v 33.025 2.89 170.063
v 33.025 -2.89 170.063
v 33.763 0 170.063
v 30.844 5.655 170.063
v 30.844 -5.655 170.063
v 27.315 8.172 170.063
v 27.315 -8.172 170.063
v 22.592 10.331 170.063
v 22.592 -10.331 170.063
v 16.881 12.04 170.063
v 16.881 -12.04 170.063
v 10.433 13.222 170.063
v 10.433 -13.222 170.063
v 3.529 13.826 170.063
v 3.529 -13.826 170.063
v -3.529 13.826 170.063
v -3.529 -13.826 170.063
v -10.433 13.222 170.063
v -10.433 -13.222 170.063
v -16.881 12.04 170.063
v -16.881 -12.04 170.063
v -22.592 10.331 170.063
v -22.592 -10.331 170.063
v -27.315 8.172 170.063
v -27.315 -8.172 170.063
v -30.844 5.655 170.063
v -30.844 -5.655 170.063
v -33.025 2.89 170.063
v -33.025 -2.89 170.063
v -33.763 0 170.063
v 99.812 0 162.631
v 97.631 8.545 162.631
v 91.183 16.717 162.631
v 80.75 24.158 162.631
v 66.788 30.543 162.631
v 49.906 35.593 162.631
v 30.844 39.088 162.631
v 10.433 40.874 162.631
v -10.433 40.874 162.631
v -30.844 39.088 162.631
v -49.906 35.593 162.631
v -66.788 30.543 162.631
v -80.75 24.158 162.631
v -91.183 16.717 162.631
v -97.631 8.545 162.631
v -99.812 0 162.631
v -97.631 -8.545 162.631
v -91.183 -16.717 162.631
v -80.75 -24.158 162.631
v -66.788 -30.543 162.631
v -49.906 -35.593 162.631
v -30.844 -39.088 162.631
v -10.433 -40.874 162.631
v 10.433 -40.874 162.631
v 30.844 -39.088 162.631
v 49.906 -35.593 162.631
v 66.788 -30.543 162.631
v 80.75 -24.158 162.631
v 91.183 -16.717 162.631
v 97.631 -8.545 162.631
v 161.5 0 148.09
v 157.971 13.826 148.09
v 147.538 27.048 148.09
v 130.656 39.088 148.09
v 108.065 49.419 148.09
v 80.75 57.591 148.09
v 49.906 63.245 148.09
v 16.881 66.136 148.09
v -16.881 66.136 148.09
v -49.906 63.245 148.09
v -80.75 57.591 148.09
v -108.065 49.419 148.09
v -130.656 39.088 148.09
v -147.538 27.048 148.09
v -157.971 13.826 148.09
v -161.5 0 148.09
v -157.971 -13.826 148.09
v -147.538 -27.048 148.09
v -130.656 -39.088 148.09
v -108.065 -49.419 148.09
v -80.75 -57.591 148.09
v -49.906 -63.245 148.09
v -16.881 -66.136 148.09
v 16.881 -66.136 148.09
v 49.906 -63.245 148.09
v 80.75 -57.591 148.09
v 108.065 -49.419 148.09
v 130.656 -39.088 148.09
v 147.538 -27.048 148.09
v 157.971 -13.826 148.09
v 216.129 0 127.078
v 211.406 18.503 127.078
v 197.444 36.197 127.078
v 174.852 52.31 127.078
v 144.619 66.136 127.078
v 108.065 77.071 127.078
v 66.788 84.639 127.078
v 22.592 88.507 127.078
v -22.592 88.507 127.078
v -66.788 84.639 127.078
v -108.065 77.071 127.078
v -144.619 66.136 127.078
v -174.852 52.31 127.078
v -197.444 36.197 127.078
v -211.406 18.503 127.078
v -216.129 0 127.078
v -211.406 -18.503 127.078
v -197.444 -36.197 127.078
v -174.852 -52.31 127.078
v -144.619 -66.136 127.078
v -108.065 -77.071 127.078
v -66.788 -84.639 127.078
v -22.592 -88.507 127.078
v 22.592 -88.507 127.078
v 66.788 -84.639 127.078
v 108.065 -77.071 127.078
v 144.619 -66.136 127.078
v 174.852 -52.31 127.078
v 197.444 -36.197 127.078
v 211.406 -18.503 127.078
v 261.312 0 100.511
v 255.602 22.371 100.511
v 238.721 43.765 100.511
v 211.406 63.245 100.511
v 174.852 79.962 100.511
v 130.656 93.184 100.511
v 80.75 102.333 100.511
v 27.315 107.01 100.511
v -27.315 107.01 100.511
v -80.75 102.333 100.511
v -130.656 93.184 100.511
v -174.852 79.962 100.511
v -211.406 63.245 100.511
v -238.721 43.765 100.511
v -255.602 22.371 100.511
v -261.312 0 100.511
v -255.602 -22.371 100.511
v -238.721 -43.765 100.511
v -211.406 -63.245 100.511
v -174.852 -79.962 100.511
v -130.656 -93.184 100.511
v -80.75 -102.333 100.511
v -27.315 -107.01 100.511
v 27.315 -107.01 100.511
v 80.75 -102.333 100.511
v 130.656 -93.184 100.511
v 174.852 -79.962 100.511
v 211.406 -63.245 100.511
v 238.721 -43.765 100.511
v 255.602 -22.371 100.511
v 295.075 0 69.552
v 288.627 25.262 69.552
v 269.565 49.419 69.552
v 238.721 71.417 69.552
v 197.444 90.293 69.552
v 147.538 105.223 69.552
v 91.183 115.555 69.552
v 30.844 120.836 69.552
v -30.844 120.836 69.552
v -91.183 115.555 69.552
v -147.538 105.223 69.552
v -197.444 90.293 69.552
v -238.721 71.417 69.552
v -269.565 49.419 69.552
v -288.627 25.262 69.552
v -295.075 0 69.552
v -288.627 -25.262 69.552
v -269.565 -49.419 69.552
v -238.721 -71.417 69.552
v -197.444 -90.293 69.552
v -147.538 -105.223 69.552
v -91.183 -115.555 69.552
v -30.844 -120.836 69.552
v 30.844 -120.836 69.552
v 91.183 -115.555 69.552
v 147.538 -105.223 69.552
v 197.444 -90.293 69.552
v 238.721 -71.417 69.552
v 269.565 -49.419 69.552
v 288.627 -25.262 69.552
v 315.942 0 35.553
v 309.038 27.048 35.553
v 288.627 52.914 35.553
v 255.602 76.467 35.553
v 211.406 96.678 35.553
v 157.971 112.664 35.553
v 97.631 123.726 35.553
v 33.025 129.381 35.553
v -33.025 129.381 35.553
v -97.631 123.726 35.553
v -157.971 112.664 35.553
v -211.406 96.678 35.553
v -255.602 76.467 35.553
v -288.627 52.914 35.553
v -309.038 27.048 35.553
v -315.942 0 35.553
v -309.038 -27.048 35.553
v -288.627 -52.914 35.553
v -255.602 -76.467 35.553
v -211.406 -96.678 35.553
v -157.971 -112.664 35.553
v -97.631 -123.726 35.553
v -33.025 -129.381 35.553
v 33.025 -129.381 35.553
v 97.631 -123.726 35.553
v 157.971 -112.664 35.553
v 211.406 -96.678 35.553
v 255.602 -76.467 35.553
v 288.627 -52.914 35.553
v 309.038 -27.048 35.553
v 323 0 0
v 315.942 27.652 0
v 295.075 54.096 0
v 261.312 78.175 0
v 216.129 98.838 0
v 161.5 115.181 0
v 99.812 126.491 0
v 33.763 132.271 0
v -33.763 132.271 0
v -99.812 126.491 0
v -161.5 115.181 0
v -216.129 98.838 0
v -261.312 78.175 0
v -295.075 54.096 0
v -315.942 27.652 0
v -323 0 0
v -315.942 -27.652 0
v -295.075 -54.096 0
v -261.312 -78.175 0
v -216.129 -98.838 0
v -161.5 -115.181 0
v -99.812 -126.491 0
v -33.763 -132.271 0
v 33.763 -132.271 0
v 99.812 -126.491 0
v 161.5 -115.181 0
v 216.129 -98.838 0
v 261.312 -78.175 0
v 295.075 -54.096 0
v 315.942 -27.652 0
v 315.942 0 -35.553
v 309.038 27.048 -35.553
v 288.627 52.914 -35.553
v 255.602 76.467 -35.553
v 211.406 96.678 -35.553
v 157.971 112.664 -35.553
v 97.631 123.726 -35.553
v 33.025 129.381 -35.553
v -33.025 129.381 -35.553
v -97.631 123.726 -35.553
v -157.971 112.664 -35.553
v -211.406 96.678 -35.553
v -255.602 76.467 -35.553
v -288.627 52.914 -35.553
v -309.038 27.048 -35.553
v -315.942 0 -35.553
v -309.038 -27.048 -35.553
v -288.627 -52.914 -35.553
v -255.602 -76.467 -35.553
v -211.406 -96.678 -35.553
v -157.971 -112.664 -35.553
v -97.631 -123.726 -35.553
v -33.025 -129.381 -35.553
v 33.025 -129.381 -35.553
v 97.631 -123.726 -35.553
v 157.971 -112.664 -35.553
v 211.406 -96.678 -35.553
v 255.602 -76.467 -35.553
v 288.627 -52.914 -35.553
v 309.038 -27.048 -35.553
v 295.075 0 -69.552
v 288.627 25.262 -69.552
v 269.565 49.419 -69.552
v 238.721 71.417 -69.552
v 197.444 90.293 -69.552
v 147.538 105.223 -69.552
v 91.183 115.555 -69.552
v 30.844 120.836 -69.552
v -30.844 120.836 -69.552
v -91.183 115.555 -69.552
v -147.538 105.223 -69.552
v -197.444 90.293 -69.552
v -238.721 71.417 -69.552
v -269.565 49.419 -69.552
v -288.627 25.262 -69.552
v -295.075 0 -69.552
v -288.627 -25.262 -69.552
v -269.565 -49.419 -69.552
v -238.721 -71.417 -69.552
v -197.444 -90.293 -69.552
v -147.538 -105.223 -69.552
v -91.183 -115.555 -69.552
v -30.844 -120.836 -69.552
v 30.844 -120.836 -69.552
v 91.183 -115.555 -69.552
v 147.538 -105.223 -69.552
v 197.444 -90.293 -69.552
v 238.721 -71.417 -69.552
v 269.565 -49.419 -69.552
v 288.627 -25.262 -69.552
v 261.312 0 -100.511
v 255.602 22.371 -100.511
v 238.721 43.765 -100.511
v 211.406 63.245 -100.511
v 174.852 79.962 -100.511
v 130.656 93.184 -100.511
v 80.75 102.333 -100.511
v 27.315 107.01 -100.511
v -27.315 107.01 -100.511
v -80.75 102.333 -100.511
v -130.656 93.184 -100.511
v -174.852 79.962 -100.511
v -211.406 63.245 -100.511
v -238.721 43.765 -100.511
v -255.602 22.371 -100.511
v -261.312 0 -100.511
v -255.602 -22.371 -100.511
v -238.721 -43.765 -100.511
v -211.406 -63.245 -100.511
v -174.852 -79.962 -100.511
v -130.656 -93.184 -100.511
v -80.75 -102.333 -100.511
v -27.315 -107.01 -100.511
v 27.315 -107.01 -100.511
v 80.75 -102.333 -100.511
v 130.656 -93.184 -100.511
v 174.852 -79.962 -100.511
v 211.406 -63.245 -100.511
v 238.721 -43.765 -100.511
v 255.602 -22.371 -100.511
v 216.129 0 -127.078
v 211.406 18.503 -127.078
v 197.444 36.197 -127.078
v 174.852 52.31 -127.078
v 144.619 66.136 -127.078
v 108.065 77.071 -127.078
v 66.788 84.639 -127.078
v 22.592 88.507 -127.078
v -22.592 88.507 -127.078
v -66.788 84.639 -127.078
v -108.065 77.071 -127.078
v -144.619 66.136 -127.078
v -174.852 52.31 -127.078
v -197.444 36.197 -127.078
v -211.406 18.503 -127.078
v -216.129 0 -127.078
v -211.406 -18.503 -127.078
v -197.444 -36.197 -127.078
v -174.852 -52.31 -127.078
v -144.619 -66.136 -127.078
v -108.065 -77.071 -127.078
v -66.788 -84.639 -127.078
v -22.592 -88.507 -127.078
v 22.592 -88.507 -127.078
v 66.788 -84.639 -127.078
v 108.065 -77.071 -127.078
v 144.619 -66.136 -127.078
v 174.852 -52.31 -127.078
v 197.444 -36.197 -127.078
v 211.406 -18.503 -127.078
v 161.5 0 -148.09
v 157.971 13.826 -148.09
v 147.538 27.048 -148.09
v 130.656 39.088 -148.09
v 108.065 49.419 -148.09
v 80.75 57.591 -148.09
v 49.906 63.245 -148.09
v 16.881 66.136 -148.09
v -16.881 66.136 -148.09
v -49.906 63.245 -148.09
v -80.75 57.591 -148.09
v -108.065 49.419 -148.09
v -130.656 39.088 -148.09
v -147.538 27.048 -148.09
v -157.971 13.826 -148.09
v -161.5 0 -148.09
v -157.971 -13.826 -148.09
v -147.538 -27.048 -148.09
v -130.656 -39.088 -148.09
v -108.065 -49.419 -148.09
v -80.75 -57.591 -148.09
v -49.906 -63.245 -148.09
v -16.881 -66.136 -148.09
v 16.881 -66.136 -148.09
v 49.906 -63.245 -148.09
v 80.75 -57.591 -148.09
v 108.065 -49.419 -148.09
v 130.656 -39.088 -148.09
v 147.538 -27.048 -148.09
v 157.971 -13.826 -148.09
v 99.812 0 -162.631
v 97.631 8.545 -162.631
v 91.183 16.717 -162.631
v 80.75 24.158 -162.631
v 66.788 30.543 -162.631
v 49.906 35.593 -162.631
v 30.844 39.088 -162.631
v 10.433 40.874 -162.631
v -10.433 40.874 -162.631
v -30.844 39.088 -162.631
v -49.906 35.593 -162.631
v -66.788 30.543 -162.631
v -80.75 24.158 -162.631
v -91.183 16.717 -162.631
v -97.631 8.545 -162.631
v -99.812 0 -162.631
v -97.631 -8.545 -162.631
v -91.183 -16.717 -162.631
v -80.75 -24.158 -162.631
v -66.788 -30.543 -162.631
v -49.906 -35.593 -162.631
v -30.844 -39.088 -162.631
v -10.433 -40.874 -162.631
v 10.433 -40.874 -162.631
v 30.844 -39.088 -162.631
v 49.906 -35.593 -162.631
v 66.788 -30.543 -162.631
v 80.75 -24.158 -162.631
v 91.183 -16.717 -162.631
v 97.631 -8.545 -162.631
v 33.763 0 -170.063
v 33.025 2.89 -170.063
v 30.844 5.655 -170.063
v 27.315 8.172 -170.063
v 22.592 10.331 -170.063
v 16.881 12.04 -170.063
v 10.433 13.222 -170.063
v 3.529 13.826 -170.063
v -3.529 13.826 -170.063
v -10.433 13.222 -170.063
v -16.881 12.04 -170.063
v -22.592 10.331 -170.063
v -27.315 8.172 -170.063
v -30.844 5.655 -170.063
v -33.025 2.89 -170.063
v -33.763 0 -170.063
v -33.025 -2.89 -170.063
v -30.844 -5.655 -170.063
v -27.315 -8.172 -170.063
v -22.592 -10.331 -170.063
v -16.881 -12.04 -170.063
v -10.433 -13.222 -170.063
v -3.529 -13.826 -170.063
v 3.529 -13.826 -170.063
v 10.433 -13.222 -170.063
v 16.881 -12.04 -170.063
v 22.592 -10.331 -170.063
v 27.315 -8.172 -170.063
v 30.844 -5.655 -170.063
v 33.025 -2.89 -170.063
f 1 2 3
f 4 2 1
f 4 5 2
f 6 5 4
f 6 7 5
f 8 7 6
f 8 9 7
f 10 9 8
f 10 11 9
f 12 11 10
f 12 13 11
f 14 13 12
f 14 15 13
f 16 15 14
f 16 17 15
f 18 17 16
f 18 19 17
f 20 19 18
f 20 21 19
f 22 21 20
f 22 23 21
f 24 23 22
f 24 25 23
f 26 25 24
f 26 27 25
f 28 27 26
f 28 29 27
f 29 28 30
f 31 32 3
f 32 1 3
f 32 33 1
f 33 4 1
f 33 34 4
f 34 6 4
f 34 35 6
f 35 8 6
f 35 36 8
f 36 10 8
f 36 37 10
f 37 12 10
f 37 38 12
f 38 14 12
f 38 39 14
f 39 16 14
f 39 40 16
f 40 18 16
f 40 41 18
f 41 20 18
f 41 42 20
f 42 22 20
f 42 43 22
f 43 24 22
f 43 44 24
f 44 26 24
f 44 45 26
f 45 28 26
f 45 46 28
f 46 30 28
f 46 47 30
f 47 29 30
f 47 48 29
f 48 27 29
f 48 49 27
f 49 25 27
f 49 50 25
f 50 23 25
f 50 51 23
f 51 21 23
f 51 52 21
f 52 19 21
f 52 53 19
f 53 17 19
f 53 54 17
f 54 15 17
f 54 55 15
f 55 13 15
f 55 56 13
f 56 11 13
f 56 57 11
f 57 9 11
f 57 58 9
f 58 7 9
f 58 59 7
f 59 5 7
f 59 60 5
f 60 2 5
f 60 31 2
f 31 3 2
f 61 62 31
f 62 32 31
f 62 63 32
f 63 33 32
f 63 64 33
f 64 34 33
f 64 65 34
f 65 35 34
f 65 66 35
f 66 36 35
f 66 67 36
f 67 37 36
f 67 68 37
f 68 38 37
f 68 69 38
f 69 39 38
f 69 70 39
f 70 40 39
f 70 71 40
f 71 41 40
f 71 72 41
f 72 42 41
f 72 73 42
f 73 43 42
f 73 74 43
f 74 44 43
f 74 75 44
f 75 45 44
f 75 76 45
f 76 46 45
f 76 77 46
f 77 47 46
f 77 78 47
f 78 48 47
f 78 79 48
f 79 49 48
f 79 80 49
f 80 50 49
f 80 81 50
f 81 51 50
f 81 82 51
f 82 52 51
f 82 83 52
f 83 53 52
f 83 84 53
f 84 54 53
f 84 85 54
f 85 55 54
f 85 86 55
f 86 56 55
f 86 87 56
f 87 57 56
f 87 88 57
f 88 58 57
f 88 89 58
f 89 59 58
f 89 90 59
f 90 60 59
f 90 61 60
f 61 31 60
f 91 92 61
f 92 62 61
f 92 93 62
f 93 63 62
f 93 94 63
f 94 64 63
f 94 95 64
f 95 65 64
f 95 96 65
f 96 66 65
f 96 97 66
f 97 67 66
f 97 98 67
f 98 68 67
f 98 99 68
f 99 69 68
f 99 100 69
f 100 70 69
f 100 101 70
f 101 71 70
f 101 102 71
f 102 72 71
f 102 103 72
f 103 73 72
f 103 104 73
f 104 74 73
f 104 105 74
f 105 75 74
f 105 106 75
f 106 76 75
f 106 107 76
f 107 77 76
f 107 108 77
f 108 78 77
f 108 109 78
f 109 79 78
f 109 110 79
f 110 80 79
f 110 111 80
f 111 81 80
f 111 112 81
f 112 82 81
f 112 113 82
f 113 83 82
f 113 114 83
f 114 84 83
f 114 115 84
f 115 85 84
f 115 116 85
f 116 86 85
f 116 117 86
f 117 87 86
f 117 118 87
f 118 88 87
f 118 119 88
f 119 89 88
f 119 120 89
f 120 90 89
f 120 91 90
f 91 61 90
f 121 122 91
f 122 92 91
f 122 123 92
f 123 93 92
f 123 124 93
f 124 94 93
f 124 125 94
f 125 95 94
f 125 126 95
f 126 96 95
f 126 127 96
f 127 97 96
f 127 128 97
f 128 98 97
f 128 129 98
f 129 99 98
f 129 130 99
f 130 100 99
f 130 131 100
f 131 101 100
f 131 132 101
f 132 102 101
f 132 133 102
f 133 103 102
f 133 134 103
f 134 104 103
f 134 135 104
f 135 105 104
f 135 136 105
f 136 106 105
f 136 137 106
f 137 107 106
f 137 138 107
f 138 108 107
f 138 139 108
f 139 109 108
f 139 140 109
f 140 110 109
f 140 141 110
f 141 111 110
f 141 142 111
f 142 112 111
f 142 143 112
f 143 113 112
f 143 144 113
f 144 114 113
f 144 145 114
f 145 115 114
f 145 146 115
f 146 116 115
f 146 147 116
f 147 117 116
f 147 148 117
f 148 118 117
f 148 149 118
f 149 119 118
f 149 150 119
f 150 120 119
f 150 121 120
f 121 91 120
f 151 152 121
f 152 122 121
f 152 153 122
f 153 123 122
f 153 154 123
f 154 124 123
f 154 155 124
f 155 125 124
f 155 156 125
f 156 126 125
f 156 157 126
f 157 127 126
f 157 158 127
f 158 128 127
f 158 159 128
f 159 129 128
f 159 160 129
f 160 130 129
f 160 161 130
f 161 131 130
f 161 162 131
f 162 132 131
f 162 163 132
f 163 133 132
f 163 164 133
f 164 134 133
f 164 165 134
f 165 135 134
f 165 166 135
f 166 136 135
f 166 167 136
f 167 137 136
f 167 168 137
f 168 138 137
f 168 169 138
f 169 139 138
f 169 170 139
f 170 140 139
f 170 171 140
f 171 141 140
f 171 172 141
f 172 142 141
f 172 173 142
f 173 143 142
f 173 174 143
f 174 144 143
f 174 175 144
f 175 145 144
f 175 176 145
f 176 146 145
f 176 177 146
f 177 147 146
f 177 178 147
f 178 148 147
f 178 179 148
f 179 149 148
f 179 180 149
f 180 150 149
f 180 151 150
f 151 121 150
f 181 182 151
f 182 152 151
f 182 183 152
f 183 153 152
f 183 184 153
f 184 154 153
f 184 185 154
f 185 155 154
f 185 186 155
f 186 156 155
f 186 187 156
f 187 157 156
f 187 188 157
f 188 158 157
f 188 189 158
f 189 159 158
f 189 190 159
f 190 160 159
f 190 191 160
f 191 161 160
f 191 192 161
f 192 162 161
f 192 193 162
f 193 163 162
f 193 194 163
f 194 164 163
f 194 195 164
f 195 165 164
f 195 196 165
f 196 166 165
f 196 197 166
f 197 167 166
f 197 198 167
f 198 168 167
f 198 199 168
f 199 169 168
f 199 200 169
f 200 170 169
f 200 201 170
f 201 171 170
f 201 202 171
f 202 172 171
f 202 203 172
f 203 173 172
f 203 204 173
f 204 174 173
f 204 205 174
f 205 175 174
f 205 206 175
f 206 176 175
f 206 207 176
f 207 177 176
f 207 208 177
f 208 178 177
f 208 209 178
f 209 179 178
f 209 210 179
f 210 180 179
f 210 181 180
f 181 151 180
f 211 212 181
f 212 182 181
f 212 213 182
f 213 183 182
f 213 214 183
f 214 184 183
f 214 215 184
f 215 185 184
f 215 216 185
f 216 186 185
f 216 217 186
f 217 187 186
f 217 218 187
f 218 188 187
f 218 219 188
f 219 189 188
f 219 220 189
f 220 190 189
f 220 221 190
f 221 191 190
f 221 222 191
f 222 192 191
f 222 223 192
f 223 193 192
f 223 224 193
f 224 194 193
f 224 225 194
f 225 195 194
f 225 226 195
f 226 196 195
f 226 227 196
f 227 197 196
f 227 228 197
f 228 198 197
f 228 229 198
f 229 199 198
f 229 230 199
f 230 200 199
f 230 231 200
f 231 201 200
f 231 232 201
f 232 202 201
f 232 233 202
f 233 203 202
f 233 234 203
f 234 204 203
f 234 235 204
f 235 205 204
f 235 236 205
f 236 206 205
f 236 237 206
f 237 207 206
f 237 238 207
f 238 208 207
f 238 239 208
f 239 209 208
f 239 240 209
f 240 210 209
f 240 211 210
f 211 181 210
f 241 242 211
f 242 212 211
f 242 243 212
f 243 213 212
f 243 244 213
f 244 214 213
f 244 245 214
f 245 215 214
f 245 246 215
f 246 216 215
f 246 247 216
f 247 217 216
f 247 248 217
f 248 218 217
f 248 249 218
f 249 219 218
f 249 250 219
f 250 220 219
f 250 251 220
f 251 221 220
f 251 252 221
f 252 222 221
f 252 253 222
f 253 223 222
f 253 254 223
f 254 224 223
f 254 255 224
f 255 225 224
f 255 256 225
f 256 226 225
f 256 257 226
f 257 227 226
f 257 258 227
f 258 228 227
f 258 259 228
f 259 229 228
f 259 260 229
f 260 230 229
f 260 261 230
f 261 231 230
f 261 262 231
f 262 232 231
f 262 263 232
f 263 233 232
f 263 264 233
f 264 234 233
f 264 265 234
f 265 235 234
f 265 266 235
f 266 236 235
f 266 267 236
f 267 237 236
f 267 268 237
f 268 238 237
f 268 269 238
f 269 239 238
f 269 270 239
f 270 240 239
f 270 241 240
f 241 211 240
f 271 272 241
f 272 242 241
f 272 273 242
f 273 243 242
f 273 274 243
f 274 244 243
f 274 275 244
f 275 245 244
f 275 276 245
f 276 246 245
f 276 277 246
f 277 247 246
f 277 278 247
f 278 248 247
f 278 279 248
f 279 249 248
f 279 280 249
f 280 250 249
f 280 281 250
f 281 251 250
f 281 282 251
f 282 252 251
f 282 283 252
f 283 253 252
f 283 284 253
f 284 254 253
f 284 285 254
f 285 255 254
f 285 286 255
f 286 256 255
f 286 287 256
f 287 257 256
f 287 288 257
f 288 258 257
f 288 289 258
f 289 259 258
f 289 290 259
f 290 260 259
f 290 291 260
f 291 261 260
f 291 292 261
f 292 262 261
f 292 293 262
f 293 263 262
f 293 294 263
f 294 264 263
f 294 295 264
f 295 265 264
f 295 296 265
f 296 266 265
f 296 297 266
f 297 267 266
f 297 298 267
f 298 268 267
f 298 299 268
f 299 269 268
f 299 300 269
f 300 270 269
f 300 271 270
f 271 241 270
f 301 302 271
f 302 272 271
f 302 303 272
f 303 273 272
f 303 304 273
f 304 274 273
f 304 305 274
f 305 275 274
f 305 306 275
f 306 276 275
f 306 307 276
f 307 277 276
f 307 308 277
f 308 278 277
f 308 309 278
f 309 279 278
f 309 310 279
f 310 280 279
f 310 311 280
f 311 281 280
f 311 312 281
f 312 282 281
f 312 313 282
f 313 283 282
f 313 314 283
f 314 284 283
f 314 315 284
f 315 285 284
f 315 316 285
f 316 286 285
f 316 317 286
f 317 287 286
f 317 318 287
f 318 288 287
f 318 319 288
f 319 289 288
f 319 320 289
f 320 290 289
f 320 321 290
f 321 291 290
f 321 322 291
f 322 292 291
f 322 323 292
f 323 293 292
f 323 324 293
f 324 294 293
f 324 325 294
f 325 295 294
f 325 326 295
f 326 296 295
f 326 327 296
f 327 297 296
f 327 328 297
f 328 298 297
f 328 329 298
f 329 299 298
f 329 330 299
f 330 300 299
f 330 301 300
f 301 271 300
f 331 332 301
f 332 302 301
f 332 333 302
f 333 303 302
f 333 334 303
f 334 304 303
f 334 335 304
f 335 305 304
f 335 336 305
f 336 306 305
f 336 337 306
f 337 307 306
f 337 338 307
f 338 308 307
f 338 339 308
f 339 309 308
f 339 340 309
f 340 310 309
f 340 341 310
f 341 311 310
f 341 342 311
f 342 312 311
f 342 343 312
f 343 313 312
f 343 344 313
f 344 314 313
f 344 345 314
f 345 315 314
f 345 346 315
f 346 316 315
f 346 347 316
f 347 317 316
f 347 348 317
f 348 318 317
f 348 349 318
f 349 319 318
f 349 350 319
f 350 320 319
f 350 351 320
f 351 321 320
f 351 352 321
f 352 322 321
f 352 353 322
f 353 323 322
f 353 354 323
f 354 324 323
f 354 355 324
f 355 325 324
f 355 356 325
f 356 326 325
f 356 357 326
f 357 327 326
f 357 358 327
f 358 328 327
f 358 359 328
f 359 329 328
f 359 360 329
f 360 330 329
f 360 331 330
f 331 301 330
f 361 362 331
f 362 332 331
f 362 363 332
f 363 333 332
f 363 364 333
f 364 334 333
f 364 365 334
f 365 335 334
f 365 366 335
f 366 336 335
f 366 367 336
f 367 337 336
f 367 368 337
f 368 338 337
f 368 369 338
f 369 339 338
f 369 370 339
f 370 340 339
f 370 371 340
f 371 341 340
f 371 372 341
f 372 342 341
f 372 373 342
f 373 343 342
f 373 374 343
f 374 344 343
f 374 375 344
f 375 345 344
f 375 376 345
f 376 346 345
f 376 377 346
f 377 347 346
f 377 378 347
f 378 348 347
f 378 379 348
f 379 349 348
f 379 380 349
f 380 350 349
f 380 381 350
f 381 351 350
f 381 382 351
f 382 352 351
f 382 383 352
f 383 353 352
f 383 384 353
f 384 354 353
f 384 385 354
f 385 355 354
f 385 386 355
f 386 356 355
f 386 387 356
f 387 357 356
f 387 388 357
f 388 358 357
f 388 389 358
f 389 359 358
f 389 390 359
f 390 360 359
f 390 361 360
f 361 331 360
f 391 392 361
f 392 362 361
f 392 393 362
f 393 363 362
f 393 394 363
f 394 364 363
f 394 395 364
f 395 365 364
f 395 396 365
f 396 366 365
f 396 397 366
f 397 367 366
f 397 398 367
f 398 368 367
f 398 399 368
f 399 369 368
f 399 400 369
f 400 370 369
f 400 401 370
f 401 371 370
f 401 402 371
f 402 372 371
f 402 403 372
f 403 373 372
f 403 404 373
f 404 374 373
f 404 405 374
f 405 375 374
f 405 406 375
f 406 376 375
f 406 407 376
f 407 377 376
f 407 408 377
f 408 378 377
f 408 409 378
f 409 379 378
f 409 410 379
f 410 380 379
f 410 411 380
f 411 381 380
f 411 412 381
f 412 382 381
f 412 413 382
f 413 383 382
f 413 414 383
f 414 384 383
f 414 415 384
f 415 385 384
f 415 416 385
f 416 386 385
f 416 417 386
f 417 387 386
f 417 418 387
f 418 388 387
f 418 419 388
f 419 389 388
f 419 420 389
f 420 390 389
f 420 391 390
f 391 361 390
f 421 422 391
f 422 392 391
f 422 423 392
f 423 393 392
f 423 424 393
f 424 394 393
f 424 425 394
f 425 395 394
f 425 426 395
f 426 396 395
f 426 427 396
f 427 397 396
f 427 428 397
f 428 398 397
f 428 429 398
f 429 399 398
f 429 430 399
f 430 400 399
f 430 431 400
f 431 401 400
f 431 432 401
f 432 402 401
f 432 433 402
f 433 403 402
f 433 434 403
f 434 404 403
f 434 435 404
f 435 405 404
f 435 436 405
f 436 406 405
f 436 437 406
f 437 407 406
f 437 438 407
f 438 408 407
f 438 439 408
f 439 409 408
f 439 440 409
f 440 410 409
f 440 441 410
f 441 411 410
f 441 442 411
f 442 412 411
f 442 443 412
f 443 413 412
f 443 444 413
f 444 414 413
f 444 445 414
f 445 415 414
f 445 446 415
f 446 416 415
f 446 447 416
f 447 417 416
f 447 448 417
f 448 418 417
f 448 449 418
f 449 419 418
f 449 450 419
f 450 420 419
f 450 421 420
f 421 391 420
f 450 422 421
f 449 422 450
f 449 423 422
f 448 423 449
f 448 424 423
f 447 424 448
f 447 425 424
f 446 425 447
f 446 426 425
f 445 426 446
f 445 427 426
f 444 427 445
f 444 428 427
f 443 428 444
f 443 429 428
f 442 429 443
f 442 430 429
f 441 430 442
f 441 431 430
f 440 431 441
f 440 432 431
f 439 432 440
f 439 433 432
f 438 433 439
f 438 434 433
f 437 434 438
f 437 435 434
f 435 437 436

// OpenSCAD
// Generated by SolidPython 1.0.1 on 2020-07-29 00:46:52


scale(v = [17, 7, 9]) {
	sphere(r = 19);
}
/***********************************************
*********      SolidPython code:      **********
************************************************
 
# import packages: SolidPython
from solid import *
from solid.utils import *
from itertools import chain, combinations, permutations


class Resize:

    def __init__(self, scad_file):
        self.scad_file = scad_file
        #self.scad_file = import_scad(scad_file)
        # cone/cylinder param:
        self.r1 = 0
        self.r2 = 0
        self.h = 0
        # rectangular prism param:
        self.w = 0
        self.l = 0
        # ellipse param:
        self.r = 0

    # import OpenScad code (file name corresponds to shape)


    # classify shape + parameters
    def assign(self, param1, param2, param3):
        if self.scad_file == 'cone.scad':
            self.r1 = param1
            self.r2 = param2
            self.h = param3
        elif self.scad_file == 'cylinder.scad':
            self.r1 = param1
            self.r2 = param2
            self.h = param3
        elif self.scad_file == 'rectangularPrism.scad':
            self.h = param1
            self.l = param2
            self.w = param3
        else:
            self.r = param1
            self.h = param2

    # resize parameters
    def iterate(self):
        x = range(3, 20, 2)
        i = 1
        if self.scad_file == 'cone.scad':
            tempList = list(permutations(x, 2))
            for temp in tempList:
                param1 = temp[0]
                param2 = temp[1]
                filepath = 'produced_scad_files/' + 'cone' + str(param1) + '_' + str(param2) + '_' + '.scad'
                scad_render_to_file(cylinder(h=param1, r1=param2, r2=0), filepath)

        elif self.scad_file == 'cylinder.scad':
            tempList = list(permutations(x, 3))
            for temp in tempList:
                param1 = temp[0]
                param2 = temp[1]
                filepath = 'produced_scad_files/' + 'cylinder' + str(param1) + '_' + str(param2) + '_' + '.scad'
                scad_render_to_file(cylinder(h=param1, r1=param2, r2=param2), filepath)

        elif self.scad_file == 'rectangularPrism.scad':
            tempList = list(permutations(x, 3))
            for temp in tempList:
                param1 = temp[0]
                param2 = temp[1]
                param3 = temp[2]
                filepath = 'produced_scad_files/' + 'rectangularPrism' + str(param1) + '_' + str(param2) + '_' + str(
                    param3) + '.scad'
                scad_render_to_file(cube(size=(param1, param2, param3)), filepath)

        elif self.scad_file == 'ellipse.scad':
            tempList = list(permutations(x, 4))
            for temp in tempList:
                param1 = temp[0]
                param2 = temp[1]
                param3 = temp[2]
                param4 = temp[3]
                filepath = 'produced_scad_files/' + 'ellipse' + str(param1) + '_' + str(param2) + '_' + str(param3) + '_' + str(param4) + '.scad'
                scad_render_to_file(scale([param1, param2, param3])(sphere(r=param4)), filepath)

    def render_to_scadfile(self):
        scad_render_to_file(scad, 'example.scad') 
 
************************************************/
